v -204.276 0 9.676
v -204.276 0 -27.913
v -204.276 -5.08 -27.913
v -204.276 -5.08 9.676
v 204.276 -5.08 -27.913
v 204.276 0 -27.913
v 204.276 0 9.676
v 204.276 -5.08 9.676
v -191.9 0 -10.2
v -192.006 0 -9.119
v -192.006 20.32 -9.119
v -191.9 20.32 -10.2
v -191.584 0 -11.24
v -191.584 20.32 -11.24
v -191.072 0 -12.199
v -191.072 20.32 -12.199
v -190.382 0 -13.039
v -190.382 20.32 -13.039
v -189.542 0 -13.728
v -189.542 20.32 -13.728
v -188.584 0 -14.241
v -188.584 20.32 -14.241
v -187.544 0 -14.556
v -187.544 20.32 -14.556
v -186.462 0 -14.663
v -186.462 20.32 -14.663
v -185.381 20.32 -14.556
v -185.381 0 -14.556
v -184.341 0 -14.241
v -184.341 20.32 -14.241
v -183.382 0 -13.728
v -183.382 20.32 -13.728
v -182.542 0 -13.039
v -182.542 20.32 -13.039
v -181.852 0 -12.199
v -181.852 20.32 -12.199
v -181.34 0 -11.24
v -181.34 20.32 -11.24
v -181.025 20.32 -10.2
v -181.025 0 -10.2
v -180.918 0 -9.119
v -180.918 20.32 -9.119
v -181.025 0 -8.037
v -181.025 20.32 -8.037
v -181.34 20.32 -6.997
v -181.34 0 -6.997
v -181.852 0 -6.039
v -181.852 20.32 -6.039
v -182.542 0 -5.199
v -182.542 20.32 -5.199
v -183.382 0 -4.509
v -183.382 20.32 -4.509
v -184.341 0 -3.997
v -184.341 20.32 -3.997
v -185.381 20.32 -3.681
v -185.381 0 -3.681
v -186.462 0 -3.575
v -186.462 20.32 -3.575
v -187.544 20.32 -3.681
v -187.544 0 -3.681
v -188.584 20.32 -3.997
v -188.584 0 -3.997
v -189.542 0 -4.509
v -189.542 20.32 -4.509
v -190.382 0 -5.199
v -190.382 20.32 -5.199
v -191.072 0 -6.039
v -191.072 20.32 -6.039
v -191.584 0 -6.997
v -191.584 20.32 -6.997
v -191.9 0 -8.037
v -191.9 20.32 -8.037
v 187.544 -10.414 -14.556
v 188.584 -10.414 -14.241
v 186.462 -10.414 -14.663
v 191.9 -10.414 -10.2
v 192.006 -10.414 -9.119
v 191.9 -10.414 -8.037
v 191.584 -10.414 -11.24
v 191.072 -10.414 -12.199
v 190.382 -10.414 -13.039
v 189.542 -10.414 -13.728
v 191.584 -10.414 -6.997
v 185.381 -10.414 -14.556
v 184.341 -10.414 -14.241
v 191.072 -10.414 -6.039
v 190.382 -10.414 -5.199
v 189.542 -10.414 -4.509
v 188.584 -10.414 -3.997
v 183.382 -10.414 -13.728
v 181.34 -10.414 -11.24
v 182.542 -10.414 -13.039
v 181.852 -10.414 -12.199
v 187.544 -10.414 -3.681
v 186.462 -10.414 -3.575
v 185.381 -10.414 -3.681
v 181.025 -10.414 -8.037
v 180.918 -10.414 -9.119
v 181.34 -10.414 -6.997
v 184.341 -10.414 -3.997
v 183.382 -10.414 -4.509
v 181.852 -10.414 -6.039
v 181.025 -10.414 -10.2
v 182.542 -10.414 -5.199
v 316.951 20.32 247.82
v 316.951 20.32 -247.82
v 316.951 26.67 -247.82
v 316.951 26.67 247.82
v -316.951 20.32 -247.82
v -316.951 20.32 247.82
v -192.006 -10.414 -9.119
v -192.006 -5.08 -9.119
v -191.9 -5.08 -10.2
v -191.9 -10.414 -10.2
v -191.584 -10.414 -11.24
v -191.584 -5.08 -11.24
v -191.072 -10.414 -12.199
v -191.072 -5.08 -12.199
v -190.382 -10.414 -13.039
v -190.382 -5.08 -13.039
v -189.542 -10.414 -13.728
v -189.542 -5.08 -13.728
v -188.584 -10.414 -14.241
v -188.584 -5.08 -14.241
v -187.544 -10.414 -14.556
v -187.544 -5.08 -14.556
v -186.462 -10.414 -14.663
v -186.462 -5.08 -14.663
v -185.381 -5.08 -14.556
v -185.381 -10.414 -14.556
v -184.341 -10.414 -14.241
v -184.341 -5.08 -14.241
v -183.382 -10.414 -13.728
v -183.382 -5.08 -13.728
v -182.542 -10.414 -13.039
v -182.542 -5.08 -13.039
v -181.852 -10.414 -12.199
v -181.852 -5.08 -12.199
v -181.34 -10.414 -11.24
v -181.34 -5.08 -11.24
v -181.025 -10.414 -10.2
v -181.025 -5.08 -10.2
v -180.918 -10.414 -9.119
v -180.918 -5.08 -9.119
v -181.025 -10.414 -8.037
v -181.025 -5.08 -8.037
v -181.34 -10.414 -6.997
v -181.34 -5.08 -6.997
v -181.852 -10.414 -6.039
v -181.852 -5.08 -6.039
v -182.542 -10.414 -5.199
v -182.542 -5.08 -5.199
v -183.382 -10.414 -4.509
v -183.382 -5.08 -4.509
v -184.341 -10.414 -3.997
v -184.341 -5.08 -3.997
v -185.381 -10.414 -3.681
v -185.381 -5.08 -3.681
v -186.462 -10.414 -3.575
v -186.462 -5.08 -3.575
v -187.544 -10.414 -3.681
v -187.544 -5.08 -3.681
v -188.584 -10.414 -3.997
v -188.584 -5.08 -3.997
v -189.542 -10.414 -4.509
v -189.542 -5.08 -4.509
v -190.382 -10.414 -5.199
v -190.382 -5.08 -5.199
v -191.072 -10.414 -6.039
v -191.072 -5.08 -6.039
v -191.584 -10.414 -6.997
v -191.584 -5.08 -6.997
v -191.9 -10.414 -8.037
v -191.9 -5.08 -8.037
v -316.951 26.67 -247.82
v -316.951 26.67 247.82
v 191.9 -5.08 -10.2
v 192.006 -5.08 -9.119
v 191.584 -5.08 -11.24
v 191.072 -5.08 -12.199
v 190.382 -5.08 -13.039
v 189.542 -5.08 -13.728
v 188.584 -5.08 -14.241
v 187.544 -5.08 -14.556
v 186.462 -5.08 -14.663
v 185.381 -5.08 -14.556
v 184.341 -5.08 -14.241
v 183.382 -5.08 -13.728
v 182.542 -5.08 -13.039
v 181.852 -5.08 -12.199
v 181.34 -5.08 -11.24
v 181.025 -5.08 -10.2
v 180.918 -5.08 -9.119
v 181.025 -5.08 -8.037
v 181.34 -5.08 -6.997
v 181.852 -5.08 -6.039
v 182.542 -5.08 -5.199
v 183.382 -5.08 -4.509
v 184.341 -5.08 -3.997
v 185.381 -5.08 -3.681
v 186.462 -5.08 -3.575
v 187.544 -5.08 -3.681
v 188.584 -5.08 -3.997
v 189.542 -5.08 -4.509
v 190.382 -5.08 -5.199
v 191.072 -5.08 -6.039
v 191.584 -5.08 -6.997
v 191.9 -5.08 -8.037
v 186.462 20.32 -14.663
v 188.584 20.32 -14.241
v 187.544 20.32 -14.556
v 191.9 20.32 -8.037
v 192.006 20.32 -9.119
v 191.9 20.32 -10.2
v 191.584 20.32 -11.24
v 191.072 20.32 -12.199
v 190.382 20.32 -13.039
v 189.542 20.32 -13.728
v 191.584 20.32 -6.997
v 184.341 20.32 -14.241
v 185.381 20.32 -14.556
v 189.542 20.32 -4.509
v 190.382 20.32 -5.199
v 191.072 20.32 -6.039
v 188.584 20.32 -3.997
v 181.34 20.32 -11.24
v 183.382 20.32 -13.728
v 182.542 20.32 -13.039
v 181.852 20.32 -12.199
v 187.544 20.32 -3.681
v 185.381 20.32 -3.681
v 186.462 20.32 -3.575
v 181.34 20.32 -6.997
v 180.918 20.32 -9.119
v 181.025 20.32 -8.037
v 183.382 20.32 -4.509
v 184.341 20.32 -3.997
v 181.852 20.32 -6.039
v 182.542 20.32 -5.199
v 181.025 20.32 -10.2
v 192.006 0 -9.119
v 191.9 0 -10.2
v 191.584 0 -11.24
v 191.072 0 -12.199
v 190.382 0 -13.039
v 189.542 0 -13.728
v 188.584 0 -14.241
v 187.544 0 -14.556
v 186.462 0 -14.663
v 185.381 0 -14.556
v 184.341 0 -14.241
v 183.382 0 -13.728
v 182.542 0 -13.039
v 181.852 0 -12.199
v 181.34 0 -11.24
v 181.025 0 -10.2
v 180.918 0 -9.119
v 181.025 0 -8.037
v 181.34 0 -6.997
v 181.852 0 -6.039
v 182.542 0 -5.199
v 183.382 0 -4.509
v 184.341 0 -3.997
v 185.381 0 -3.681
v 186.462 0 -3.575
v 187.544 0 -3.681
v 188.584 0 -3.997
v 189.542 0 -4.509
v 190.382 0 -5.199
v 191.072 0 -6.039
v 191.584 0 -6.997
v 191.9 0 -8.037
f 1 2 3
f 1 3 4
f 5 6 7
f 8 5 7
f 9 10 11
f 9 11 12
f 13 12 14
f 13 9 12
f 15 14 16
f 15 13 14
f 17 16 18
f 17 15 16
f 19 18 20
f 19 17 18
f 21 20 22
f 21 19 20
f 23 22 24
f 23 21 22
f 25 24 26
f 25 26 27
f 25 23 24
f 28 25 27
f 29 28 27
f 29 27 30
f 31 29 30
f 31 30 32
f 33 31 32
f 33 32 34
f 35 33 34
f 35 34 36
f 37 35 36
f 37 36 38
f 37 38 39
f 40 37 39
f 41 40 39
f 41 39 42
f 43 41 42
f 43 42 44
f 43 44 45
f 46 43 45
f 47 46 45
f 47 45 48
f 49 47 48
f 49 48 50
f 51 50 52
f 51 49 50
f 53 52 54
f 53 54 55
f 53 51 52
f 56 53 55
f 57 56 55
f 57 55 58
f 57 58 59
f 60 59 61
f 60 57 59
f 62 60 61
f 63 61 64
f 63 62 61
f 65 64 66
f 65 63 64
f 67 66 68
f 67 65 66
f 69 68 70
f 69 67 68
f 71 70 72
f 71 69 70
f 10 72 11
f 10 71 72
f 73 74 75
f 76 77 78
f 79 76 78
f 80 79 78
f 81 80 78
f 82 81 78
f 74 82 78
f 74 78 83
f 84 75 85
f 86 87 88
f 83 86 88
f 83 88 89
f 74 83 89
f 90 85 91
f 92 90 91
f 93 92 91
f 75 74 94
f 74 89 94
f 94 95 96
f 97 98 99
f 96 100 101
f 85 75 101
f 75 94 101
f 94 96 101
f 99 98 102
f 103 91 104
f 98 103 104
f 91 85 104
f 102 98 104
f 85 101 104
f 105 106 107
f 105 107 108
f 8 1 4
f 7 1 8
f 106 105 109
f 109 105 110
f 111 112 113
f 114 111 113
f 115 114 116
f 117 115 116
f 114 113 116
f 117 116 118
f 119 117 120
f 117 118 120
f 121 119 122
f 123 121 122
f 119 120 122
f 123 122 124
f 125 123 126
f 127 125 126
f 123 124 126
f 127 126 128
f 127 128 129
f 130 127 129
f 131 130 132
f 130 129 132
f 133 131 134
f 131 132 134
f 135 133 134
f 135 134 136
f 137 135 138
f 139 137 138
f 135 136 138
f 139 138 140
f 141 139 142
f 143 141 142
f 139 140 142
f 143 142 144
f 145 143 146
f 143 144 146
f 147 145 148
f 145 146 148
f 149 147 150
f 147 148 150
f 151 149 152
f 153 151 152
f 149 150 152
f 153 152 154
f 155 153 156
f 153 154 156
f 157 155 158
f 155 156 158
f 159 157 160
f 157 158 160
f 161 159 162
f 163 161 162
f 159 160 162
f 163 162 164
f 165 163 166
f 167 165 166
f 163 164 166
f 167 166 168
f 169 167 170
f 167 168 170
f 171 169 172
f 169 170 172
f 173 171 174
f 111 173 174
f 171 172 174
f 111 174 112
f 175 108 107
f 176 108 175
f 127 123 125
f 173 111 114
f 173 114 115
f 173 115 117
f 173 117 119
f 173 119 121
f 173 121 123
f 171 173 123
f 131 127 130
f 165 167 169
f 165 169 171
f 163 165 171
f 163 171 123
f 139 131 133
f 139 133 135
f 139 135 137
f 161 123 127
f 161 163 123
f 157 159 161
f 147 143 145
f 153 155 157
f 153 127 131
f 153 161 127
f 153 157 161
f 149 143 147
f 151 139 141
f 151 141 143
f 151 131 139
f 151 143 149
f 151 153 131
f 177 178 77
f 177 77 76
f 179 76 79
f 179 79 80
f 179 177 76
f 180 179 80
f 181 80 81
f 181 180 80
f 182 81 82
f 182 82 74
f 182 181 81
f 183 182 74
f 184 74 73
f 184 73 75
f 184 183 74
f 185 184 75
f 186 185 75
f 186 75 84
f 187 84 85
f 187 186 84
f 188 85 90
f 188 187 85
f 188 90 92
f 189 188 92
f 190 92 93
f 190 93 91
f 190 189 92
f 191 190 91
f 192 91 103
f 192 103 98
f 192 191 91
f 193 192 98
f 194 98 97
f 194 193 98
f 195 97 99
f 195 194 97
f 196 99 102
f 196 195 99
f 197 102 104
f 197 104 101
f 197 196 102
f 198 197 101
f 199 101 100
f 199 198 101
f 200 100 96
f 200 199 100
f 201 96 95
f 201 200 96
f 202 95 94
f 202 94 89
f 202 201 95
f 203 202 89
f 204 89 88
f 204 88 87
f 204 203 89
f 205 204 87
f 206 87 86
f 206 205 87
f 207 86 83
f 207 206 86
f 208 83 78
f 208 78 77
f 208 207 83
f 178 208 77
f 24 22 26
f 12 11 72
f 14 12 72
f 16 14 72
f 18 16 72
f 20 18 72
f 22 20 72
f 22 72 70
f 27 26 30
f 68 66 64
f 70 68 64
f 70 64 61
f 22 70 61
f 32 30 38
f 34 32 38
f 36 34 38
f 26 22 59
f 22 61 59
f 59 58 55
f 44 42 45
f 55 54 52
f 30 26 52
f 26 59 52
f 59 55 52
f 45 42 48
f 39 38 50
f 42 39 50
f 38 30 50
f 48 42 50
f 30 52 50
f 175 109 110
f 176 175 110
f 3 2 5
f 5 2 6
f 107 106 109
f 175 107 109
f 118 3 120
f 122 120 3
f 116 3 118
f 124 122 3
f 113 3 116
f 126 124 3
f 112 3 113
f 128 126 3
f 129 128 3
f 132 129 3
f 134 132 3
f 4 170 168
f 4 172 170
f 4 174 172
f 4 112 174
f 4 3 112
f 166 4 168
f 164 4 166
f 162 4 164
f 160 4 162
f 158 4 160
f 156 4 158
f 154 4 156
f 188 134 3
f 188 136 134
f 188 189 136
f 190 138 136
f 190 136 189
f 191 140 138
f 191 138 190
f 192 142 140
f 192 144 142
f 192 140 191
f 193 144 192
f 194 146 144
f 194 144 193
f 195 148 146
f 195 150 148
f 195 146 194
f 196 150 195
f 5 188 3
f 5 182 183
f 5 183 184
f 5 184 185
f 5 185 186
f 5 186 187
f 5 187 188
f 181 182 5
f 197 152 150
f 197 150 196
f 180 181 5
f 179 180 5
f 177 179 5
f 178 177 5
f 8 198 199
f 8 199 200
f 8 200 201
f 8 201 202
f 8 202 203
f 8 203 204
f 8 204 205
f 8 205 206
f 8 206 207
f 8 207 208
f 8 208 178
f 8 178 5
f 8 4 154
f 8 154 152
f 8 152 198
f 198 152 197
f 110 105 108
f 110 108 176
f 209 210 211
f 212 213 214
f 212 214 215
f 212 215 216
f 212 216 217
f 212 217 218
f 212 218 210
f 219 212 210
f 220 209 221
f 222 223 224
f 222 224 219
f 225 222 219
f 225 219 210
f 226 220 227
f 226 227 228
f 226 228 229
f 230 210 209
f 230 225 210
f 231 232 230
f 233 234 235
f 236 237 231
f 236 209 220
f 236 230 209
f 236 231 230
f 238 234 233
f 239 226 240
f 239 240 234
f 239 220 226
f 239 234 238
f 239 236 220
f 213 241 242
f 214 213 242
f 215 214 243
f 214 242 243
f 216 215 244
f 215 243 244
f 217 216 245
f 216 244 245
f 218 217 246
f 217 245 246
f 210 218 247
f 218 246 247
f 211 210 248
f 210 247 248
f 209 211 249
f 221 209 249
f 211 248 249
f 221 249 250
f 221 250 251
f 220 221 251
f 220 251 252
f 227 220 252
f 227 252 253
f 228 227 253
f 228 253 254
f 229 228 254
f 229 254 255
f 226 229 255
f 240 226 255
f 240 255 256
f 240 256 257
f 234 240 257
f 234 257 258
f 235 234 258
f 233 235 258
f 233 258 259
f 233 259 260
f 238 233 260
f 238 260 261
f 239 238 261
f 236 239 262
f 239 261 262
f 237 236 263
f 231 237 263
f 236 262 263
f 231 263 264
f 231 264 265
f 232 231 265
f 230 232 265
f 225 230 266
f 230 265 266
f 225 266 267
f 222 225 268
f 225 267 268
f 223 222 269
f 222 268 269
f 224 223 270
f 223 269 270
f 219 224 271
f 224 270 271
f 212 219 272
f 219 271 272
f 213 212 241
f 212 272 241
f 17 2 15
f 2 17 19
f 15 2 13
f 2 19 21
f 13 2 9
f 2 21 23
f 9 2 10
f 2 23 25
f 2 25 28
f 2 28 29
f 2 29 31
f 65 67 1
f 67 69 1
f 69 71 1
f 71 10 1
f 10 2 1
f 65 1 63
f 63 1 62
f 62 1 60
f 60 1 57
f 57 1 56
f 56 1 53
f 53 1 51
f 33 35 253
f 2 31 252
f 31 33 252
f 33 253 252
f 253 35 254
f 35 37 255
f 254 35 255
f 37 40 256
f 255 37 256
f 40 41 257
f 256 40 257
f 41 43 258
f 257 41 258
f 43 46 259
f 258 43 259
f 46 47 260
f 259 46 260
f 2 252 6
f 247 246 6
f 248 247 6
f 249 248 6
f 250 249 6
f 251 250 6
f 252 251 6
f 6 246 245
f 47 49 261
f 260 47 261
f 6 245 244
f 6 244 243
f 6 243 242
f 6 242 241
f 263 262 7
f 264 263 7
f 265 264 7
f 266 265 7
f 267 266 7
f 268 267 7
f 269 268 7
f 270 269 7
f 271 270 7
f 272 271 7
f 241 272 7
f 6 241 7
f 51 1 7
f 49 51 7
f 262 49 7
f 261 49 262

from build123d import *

# Parameters (mm, degrees)
F0_W          = 408.5518717766
F0_H          = 37.5892921885
F1_DEPTH      = 5.08
F3_DEPTH      = 5.334
F3_DEPTH_BACK = 25.4
F5_W          = 633.9019536972
F5_H          = 495.6407546997
F6_DEPTH      = 6.35


with BuildPart() as f1:
    # F0 (on Front) → F1 (new body)
    with BuildSketch(Plane.XZ):
        with Locations((0, -9.1188331868)):
            Rectangle(F0_W, F0_H)
    extrude(amount=F1_DEPTH)

    # F2 (on face) → F3 (join, two sides)
    with BuildSketch(Plane.XZ.offset(5.08)) as f3_sk:
        with BuildLine():
            ThreePointArc((-180.9181509954, -9.1188331868), (-186.4621341228, -3.5748500593), (-192.0061172503, -9.1188331868))
            Line((-192.0061172503, -9.1188331868), (-180.9181509954, -9.1188331868))
        make_face()
        with BuildLine():
            Line((-180.9181509954, -9.1188331868), (-192.0061172503, -9.1188331868))
            ThreePointArc((-192.0061172503, -9.1188331868), (-186.4621341228, -14.6628163142), (-180.9181509954, -9.1188331868))
        make_face()
    extrude(amount=F3_DEPTH)
    extrude(f3_sk.sketch, amount=-F3_DEPTH_BACK)

    # F4: F1 across plane


with BuildPart() as f1_1:
    add(f1.part)
    add(f1.part.mirror(Plane.YZ))


with BuildPart() as f6:
    # F5 (on face) → F6 (new body)
    with BuildSketch(Plane(origin=(0, 20.32, 0), x_dir=(-1, 0, 0), z_dir=(0, 1, 0))):
        Rectangle(F5_W, F5_H)
    extrude(amount=F6_DEPTH)


solid = Compound([f1_1.part, f6.part])
